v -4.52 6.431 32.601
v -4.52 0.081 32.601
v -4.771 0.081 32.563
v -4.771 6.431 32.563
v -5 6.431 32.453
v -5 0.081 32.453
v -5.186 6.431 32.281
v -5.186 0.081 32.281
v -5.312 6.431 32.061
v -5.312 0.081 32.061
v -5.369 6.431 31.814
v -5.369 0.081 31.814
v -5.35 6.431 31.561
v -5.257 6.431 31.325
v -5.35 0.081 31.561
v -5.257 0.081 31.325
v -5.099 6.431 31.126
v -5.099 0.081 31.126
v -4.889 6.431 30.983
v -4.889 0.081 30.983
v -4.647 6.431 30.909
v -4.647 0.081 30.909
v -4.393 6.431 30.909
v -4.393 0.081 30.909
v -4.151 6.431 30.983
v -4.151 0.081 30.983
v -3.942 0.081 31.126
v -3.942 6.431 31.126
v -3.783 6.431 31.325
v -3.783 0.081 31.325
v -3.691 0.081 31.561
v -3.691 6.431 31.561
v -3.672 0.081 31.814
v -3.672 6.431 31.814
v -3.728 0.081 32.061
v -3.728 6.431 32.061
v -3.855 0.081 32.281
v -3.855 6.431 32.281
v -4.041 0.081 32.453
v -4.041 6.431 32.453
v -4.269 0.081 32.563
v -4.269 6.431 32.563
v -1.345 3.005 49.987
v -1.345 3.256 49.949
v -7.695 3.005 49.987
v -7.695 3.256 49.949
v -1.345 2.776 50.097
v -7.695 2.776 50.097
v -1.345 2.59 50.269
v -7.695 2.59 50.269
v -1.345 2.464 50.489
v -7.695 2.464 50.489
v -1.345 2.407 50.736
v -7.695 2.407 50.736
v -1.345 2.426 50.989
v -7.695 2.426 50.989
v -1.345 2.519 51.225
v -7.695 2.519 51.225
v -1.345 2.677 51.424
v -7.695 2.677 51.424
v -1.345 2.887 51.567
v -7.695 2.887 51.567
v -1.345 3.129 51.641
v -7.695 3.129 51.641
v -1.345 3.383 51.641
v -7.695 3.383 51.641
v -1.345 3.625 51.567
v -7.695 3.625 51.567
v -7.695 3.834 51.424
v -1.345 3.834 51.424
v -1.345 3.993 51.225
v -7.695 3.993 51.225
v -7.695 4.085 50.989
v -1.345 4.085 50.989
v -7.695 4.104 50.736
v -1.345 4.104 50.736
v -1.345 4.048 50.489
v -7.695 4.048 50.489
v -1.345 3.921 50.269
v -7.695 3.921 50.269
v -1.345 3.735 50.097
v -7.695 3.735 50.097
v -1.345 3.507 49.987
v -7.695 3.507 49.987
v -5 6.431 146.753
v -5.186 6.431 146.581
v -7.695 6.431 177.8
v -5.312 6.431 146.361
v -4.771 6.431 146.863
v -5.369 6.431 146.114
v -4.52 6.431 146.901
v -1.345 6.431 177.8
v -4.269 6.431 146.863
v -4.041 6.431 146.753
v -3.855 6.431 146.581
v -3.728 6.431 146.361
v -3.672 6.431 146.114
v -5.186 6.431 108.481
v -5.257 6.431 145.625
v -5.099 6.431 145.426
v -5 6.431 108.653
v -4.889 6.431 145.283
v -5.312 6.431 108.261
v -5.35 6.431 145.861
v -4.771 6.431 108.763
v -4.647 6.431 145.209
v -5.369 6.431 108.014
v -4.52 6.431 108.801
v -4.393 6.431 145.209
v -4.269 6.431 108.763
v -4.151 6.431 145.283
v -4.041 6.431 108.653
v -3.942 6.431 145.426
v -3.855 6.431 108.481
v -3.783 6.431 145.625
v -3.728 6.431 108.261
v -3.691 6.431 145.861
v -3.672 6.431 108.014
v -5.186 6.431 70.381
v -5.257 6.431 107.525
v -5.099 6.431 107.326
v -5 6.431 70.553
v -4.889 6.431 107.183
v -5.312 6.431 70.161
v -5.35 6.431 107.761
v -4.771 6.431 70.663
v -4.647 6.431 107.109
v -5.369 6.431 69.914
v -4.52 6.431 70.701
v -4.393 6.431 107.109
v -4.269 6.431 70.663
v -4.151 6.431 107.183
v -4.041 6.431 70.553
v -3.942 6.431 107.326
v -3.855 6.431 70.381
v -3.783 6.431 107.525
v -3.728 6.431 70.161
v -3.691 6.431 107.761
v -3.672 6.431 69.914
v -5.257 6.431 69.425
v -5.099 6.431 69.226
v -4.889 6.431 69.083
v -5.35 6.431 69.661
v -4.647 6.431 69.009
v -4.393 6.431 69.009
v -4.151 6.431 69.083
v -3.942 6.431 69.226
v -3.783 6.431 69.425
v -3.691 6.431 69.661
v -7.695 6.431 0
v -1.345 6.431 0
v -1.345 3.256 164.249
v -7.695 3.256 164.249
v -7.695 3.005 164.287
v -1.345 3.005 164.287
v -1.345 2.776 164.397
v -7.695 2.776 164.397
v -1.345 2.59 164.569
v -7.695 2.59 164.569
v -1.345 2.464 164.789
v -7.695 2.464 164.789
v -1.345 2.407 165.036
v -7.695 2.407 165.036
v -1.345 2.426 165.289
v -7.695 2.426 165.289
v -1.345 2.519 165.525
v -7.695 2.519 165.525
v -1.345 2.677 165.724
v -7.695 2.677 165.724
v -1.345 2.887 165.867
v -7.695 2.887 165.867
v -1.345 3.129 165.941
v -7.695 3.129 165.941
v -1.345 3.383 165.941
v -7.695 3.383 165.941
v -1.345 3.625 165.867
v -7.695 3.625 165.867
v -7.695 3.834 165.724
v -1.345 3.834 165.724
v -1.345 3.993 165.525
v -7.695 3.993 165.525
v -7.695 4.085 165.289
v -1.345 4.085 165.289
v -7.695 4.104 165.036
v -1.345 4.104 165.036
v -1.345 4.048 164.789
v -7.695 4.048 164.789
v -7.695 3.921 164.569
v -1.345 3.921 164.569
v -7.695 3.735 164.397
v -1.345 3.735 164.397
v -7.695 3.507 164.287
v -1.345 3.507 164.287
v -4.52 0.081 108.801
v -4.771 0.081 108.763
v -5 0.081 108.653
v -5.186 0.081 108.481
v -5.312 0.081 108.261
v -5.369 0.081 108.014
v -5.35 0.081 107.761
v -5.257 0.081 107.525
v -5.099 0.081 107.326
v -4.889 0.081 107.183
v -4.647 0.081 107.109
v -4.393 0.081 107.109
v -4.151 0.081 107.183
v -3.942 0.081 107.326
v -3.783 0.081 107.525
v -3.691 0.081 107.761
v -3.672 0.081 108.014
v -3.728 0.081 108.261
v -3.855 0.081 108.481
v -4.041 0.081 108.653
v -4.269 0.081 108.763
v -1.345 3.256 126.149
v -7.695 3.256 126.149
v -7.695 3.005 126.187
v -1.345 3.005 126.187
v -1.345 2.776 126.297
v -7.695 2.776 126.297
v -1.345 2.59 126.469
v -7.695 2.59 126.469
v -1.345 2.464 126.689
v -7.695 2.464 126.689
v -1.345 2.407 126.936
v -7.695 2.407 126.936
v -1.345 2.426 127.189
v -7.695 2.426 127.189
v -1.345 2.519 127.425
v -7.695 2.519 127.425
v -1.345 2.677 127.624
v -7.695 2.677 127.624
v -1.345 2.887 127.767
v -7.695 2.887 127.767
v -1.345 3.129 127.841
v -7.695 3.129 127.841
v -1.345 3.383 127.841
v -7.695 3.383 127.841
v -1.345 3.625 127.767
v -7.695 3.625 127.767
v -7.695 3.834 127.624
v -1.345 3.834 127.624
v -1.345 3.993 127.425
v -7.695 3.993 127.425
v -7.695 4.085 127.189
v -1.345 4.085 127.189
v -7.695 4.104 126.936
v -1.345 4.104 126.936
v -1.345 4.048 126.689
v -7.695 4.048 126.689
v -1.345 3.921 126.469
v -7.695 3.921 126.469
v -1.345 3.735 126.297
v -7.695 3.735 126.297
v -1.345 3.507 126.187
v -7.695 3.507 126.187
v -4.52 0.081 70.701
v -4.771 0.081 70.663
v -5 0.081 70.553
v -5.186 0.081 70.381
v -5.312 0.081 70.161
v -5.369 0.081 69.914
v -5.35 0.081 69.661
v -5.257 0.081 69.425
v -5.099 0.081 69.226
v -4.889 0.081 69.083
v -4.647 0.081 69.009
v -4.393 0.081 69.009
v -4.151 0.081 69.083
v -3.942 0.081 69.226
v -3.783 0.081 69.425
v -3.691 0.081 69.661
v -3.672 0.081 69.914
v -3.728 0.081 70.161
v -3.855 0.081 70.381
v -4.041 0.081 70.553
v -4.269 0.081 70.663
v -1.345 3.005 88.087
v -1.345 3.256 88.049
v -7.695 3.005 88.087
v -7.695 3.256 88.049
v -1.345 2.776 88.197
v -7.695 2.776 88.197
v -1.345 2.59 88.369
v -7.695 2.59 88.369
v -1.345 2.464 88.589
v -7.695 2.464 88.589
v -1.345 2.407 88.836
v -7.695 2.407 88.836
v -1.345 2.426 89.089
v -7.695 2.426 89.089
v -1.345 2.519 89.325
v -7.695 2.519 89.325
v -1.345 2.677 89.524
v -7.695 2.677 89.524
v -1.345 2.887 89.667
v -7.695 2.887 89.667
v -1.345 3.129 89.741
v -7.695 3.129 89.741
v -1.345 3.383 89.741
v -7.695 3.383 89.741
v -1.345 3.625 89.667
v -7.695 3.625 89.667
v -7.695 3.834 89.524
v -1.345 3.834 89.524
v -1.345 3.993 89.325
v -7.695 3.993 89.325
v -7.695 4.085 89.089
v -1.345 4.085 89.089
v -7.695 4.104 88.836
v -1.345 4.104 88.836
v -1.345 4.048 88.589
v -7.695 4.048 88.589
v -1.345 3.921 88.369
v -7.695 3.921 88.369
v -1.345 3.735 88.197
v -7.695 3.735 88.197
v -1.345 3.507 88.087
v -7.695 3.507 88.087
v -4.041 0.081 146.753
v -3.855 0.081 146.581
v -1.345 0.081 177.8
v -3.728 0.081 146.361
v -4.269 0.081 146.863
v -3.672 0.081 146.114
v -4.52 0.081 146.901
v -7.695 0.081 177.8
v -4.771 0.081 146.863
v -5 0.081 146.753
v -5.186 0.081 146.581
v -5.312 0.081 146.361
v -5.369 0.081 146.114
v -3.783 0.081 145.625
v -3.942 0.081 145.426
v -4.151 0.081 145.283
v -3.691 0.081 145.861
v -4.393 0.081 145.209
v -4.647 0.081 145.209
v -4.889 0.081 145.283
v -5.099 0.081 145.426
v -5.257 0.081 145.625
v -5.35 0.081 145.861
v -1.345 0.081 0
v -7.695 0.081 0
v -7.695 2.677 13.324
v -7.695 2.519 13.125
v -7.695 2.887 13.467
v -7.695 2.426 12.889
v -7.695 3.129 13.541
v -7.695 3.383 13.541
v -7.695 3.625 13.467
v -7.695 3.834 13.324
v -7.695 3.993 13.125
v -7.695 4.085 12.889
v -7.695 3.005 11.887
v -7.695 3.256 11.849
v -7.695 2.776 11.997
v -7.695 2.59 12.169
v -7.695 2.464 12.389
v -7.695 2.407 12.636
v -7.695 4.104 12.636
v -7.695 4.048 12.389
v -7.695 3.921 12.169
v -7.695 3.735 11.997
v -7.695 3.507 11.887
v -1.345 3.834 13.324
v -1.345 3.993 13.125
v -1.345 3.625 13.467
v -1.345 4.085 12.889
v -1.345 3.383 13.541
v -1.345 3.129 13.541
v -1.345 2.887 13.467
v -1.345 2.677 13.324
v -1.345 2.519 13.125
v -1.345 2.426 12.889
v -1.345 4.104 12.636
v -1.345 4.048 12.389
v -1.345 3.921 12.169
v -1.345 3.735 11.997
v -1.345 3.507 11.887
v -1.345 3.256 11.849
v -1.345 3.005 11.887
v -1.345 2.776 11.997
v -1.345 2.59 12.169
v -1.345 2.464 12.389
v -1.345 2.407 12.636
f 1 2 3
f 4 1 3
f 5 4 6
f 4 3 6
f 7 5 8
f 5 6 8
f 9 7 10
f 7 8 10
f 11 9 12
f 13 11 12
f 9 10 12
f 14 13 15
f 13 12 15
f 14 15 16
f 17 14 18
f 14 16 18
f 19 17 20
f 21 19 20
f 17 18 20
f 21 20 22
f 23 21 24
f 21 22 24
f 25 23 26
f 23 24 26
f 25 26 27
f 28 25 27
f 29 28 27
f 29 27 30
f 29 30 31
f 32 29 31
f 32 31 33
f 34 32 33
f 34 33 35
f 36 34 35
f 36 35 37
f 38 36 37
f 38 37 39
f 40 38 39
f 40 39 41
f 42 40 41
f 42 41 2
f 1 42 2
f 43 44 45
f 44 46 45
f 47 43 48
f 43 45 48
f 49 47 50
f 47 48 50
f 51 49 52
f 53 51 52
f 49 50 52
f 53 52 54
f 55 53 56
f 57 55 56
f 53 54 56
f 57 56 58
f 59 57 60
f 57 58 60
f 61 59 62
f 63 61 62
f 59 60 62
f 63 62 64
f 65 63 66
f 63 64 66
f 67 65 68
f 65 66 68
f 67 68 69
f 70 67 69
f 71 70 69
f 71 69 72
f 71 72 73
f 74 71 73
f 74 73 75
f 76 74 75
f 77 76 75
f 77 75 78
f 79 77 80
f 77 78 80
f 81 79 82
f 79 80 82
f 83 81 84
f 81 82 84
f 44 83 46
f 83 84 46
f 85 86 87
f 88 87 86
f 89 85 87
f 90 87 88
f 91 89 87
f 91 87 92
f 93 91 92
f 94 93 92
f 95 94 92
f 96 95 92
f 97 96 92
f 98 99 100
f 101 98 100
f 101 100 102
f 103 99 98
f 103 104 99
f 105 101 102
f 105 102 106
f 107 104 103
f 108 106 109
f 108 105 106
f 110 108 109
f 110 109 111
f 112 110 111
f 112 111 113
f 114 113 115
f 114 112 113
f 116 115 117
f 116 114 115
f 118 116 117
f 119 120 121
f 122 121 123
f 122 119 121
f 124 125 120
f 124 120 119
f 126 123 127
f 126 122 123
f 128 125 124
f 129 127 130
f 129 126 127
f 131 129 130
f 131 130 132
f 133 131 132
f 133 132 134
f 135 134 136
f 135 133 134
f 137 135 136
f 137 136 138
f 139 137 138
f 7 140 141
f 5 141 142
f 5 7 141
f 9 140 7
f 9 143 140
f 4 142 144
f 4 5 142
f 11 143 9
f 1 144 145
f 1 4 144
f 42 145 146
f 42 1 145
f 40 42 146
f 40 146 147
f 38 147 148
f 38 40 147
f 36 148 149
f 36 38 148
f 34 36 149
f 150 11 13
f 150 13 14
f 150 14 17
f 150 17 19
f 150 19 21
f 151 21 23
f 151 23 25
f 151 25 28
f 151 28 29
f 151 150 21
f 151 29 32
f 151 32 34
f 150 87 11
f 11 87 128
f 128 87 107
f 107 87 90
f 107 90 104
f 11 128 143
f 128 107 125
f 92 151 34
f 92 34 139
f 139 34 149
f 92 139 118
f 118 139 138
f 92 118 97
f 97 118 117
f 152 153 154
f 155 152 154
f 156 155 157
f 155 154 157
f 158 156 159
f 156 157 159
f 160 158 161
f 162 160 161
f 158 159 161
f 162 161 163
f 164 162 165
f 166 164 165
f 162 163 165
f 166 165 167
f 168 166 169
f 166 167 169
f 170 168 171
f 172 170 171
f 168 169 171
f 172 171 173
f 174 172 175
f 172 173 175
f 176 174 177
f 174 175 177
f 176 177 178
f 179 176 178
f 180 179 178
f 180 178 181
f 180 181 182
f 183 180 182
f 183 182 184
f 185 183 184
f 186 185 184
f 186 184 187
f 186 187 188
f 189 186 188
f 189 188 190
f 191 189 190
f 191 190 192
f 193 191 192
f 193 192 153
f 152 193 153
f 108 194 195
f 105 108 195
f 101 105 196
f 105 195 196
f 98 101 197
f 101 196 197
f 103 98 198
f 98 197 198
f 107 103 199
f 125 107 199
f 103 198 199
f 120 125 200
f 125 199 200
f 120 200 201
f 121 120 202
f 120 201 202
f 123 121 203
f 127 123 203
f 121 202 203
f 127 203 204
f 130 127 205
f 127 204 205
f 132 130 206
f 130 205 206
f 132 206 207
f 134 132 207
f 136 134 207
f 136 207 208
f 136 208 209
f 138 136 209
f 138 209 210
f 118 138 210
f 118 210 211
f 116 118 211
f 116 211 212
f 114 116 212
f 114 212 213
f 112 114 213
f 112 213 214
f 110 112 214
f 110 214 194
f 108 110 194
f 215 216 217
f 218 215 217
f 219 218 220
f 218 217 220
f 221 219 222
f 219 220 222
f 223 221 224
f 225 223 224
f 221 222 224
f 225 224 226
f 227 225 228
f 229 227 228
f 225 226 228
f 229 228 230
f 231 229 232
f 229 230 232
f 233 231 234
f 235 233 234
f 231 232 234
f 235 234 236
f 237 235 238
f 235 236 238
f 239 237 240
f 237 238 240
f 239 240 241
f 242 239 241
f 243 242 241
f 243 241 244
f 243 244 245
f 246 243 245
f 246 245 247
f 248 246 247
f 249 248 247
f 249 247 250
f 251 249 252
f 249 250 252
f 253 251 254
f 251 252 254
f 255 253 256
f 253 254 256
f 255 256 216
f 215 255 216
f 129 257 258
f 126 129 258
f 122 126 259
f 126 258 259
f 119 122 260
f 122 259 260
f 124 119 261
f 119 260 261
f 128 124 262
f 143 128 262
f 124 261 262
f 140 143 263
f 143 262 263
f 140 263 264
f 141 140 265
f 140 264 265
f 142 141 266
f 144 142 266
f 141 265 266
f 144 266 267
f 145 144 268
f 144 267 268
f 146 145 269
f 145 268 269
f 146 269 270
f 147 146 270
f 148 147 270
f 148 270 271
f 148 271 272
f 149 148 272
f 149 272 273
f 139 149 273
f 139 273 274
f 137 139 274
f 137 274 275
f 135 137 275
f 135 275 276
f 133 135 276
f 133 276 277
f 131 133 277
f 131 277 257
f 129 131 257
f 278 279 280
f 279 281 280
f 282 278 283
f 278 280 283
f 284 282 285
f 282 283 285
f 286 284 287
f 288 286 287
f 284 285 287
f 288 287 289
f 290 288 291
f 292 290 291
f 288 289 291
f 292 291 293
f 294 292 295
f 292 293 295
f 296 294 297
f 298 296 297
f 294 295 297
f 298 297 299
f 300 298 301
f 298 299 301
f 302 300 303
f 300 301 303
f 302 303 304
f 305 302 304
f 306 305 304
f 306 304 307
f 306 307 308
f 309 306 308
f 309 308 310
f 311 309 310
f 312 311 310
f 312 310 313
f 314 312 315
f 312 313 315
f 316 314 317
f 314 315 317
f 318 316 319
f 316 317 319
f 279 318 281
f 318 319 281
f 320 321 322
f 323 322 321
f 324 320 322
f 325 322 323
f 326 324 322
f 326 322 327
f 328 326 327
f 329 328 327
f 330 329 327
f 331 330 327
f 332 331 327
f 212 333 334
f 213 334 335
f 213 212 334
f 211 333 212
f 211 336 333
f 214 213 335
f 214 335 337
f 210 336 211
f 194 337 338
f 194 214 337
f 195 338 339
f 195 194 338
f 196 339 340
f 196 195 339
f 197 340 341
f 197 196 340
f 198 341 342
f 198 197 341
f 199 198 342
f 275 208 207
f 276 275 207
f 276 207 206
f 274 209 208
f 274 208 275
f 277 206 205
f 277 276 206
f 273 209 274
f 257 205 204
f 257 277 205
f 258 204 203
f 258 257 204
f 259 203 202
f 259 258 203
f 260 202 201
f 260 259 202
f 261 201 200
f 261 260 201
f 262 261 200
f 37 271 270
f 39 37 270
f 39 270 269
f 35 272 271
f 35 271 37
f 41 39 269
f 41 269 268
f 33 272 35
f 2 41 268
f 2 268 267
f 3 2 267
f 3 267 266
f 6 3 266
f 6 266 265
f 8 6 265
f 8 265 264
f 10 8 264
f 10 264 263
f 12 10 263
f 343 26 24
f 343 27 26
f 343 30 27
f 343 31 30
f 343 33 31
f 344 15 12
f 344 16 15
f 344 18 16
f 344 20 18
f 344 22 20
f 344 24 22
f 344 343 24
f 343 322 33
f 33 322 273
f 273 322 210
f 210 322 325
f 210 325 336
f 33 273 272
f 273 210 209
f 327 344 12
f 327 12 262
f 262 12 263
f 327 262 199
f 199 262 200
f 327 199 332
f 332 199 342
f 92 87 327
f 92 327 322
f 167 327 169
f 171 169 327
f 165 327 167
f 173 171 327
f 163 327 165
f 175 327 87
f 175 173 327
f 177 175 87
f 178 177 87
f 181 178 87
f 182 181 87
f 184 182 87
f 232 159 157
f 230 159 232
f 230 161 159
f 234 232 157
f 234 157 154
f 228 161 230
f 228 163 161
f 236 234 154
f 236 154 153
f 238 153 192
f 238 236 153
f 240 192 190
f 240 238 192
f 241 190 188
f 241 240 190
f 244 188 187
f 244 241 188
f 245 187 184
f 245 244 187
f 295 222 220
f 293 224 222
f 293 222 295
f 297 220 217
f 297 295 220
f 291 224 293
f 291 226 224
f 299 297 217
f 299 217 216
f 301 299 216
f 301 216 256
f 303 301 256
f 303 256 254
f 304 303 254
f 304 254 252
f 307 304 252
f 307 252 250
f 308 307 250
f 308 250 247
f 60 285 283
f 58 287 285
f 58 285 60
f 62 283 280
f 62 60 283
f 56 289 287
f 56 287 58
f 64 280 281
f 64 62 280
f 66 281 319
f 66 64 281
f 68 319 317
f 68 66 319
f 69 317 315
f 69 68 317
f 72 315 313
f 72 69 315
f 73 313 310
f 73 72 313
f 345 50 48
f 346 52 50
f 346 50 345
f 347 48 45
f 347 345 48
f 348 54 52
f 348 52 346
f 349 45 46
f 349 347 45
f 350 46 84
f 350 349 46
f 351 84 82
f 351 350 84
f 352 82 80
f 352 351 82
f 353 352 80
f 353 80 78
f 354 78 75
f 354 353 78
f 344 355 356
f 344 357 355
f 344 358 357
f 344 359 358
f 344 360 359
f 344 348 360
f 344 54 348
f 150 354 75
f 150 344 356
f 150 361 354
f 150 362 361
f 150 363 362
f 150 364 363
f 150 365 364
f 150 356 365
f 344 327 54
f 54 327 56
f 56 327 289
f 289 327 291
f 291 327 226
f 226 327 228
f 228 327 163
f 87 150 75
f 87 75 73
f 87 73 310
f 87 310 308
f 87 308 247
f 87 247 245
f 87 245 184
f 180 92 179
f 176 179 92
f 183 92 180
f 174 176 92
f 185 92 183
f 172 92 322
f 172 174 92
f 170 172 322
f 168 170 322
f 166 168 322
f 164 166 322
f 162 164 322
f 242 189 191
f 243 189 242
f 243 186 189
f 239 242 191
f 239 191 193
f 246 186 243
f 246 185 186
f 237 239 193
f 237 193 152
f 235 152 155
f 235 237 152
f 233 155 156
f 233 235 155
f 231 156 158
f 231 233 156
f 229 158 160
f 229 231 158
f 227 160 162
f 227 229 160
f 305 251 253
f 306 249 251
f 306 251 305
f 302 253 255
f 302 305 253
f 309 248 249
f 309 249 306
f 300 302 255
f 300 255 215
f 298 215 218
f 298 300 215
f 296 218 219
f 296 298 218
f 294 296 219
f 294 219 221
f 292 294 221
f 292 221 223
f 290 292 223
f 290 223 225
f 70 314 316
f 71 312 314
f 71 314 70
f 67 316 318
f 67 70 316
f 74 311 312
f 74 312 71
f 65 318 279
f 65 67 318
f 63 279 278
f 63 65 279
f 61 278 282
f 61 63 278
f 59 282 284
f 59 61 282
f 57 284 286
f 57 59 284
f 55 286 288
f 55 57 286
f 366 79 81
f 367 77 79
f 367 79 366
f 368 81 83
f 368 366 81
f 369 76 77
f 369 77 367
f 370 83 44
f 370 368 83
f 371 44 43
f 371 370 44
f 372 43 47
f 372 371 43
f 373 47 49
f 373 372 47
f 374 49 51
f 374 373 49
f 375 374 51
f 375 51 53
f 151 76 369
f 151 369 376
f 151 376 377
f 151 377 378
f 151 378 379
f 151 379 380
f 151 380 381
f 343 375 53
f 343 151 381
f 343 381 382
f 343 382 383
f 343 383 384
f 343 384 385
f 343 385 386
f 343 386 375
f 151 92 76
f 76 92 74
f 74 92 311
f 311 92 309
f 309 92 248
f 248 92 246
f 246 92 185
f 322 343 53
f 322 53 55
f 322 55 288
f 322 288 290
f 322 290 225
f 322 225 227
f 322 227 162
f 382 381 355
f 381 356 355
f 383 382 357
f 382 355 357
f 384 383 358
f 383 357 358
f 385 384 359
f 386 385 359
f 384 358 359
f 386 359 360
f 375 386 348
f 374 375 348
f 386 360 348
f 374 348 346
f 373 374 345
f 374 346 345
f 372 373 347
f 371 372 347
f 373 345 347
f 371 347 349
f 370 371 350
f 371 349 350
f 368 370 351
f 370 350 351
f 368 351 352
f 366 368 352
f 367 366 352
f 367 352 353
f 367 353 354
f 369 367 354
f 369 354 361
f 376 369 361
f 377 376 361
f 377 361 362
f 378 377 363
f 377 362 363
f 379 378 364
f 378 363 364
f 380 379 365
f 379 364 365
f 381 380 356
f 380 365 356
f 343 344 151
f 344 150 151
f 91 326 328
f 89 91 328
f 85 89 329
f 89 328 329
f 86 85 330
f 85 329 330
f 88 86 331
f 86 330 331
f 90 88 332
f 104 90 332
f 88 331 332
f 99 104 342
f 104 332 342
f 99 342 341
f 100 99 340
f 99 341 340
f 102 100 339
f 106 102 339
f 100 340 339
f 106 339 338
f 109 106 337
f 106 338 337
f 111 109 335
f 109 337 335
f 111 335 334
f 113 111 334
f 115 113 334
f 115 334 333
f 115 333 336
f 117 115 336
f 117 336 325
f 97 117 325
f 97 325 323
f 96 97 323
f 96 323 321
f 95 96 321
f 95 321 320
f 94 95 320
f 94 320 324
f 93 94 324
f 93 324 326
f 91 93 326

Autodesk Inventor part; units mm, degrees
ref_plane "YZ Plane" through (0, 0, 0) normal (1, 0, 0) x (0, 1, 0)
ref_plane "XZ Plane" through (0, 0, 0) normal (0, 1, 0) x (-1, 0, 0)
ref_plane "XY Plane" through (0, 0, 0) normal (0, 0, 1) x (1, 0, 0)
sketch "Sketch1" plane through (0, 0, 0) normal (0, 0, 1) x (1, 0, 0)
  line L0 (-7.6953, 6.4307) -> (-1.3453, 6.4307)
  line L1 (-1.3453, 6.4307) -> (-1.3453, 0.0807)
  line L2 (-1.3453, 0.0807) -> (-7.6953, 0.0807)
  line L3 (-7.6953, 0.0807) -> (-7.6953, 6.4307)
  point P0 (0, 0)
  dimension "d0" = 6.35
  dimension "d2" = 6.35
extrude "Extrusion1" add sketch "Sketch1" along normal blind 177.8
sketch "Sketch2" plane through (-1.3453, 0.0807, 0) normal (1, 0, 0) x (0, 0, -1)
  point P0 (-177.8, 6.35)
  point P1 (0, -0.0807)
  point P2 (-165.1, 3.175)
  dimension "d5" = 3.175
  dimension "d6" = 12.7
hole "Hole1" at (-1.3453, 3.2557, 165.1) direction (-1, 0, 0) diameter 1.7018 end through all
pattern_linear "Rectangular Pattern1" count 5 spacing 38.1 along (0, 0, -1) of "Hole1"
sketch "Sketch3" plane through (160.5797, 6.4307, 92.075) normal (0, 1, 0) x (1, 0, 0)
  point P0 (0, -0.0807)
  point P1 (-165.1, -53.975)
  point P2 (-161.925, -85.725)
  point P3 (-168.275, -85.725)
  dimension "d33" = 31.75
  dimension "d37" = 3.175
hole "Hole2" at (-4.5203, 6.4307, 146.05) direction (0, -1, 0) diameter 1.7018 end through all
pattern_linear "Rectangular Pattern2" count 4 spacing 38.1 along (0, 0, -1) of "Hole2"
properties part number "mounting rail 8.6x.250" material "Gold"
